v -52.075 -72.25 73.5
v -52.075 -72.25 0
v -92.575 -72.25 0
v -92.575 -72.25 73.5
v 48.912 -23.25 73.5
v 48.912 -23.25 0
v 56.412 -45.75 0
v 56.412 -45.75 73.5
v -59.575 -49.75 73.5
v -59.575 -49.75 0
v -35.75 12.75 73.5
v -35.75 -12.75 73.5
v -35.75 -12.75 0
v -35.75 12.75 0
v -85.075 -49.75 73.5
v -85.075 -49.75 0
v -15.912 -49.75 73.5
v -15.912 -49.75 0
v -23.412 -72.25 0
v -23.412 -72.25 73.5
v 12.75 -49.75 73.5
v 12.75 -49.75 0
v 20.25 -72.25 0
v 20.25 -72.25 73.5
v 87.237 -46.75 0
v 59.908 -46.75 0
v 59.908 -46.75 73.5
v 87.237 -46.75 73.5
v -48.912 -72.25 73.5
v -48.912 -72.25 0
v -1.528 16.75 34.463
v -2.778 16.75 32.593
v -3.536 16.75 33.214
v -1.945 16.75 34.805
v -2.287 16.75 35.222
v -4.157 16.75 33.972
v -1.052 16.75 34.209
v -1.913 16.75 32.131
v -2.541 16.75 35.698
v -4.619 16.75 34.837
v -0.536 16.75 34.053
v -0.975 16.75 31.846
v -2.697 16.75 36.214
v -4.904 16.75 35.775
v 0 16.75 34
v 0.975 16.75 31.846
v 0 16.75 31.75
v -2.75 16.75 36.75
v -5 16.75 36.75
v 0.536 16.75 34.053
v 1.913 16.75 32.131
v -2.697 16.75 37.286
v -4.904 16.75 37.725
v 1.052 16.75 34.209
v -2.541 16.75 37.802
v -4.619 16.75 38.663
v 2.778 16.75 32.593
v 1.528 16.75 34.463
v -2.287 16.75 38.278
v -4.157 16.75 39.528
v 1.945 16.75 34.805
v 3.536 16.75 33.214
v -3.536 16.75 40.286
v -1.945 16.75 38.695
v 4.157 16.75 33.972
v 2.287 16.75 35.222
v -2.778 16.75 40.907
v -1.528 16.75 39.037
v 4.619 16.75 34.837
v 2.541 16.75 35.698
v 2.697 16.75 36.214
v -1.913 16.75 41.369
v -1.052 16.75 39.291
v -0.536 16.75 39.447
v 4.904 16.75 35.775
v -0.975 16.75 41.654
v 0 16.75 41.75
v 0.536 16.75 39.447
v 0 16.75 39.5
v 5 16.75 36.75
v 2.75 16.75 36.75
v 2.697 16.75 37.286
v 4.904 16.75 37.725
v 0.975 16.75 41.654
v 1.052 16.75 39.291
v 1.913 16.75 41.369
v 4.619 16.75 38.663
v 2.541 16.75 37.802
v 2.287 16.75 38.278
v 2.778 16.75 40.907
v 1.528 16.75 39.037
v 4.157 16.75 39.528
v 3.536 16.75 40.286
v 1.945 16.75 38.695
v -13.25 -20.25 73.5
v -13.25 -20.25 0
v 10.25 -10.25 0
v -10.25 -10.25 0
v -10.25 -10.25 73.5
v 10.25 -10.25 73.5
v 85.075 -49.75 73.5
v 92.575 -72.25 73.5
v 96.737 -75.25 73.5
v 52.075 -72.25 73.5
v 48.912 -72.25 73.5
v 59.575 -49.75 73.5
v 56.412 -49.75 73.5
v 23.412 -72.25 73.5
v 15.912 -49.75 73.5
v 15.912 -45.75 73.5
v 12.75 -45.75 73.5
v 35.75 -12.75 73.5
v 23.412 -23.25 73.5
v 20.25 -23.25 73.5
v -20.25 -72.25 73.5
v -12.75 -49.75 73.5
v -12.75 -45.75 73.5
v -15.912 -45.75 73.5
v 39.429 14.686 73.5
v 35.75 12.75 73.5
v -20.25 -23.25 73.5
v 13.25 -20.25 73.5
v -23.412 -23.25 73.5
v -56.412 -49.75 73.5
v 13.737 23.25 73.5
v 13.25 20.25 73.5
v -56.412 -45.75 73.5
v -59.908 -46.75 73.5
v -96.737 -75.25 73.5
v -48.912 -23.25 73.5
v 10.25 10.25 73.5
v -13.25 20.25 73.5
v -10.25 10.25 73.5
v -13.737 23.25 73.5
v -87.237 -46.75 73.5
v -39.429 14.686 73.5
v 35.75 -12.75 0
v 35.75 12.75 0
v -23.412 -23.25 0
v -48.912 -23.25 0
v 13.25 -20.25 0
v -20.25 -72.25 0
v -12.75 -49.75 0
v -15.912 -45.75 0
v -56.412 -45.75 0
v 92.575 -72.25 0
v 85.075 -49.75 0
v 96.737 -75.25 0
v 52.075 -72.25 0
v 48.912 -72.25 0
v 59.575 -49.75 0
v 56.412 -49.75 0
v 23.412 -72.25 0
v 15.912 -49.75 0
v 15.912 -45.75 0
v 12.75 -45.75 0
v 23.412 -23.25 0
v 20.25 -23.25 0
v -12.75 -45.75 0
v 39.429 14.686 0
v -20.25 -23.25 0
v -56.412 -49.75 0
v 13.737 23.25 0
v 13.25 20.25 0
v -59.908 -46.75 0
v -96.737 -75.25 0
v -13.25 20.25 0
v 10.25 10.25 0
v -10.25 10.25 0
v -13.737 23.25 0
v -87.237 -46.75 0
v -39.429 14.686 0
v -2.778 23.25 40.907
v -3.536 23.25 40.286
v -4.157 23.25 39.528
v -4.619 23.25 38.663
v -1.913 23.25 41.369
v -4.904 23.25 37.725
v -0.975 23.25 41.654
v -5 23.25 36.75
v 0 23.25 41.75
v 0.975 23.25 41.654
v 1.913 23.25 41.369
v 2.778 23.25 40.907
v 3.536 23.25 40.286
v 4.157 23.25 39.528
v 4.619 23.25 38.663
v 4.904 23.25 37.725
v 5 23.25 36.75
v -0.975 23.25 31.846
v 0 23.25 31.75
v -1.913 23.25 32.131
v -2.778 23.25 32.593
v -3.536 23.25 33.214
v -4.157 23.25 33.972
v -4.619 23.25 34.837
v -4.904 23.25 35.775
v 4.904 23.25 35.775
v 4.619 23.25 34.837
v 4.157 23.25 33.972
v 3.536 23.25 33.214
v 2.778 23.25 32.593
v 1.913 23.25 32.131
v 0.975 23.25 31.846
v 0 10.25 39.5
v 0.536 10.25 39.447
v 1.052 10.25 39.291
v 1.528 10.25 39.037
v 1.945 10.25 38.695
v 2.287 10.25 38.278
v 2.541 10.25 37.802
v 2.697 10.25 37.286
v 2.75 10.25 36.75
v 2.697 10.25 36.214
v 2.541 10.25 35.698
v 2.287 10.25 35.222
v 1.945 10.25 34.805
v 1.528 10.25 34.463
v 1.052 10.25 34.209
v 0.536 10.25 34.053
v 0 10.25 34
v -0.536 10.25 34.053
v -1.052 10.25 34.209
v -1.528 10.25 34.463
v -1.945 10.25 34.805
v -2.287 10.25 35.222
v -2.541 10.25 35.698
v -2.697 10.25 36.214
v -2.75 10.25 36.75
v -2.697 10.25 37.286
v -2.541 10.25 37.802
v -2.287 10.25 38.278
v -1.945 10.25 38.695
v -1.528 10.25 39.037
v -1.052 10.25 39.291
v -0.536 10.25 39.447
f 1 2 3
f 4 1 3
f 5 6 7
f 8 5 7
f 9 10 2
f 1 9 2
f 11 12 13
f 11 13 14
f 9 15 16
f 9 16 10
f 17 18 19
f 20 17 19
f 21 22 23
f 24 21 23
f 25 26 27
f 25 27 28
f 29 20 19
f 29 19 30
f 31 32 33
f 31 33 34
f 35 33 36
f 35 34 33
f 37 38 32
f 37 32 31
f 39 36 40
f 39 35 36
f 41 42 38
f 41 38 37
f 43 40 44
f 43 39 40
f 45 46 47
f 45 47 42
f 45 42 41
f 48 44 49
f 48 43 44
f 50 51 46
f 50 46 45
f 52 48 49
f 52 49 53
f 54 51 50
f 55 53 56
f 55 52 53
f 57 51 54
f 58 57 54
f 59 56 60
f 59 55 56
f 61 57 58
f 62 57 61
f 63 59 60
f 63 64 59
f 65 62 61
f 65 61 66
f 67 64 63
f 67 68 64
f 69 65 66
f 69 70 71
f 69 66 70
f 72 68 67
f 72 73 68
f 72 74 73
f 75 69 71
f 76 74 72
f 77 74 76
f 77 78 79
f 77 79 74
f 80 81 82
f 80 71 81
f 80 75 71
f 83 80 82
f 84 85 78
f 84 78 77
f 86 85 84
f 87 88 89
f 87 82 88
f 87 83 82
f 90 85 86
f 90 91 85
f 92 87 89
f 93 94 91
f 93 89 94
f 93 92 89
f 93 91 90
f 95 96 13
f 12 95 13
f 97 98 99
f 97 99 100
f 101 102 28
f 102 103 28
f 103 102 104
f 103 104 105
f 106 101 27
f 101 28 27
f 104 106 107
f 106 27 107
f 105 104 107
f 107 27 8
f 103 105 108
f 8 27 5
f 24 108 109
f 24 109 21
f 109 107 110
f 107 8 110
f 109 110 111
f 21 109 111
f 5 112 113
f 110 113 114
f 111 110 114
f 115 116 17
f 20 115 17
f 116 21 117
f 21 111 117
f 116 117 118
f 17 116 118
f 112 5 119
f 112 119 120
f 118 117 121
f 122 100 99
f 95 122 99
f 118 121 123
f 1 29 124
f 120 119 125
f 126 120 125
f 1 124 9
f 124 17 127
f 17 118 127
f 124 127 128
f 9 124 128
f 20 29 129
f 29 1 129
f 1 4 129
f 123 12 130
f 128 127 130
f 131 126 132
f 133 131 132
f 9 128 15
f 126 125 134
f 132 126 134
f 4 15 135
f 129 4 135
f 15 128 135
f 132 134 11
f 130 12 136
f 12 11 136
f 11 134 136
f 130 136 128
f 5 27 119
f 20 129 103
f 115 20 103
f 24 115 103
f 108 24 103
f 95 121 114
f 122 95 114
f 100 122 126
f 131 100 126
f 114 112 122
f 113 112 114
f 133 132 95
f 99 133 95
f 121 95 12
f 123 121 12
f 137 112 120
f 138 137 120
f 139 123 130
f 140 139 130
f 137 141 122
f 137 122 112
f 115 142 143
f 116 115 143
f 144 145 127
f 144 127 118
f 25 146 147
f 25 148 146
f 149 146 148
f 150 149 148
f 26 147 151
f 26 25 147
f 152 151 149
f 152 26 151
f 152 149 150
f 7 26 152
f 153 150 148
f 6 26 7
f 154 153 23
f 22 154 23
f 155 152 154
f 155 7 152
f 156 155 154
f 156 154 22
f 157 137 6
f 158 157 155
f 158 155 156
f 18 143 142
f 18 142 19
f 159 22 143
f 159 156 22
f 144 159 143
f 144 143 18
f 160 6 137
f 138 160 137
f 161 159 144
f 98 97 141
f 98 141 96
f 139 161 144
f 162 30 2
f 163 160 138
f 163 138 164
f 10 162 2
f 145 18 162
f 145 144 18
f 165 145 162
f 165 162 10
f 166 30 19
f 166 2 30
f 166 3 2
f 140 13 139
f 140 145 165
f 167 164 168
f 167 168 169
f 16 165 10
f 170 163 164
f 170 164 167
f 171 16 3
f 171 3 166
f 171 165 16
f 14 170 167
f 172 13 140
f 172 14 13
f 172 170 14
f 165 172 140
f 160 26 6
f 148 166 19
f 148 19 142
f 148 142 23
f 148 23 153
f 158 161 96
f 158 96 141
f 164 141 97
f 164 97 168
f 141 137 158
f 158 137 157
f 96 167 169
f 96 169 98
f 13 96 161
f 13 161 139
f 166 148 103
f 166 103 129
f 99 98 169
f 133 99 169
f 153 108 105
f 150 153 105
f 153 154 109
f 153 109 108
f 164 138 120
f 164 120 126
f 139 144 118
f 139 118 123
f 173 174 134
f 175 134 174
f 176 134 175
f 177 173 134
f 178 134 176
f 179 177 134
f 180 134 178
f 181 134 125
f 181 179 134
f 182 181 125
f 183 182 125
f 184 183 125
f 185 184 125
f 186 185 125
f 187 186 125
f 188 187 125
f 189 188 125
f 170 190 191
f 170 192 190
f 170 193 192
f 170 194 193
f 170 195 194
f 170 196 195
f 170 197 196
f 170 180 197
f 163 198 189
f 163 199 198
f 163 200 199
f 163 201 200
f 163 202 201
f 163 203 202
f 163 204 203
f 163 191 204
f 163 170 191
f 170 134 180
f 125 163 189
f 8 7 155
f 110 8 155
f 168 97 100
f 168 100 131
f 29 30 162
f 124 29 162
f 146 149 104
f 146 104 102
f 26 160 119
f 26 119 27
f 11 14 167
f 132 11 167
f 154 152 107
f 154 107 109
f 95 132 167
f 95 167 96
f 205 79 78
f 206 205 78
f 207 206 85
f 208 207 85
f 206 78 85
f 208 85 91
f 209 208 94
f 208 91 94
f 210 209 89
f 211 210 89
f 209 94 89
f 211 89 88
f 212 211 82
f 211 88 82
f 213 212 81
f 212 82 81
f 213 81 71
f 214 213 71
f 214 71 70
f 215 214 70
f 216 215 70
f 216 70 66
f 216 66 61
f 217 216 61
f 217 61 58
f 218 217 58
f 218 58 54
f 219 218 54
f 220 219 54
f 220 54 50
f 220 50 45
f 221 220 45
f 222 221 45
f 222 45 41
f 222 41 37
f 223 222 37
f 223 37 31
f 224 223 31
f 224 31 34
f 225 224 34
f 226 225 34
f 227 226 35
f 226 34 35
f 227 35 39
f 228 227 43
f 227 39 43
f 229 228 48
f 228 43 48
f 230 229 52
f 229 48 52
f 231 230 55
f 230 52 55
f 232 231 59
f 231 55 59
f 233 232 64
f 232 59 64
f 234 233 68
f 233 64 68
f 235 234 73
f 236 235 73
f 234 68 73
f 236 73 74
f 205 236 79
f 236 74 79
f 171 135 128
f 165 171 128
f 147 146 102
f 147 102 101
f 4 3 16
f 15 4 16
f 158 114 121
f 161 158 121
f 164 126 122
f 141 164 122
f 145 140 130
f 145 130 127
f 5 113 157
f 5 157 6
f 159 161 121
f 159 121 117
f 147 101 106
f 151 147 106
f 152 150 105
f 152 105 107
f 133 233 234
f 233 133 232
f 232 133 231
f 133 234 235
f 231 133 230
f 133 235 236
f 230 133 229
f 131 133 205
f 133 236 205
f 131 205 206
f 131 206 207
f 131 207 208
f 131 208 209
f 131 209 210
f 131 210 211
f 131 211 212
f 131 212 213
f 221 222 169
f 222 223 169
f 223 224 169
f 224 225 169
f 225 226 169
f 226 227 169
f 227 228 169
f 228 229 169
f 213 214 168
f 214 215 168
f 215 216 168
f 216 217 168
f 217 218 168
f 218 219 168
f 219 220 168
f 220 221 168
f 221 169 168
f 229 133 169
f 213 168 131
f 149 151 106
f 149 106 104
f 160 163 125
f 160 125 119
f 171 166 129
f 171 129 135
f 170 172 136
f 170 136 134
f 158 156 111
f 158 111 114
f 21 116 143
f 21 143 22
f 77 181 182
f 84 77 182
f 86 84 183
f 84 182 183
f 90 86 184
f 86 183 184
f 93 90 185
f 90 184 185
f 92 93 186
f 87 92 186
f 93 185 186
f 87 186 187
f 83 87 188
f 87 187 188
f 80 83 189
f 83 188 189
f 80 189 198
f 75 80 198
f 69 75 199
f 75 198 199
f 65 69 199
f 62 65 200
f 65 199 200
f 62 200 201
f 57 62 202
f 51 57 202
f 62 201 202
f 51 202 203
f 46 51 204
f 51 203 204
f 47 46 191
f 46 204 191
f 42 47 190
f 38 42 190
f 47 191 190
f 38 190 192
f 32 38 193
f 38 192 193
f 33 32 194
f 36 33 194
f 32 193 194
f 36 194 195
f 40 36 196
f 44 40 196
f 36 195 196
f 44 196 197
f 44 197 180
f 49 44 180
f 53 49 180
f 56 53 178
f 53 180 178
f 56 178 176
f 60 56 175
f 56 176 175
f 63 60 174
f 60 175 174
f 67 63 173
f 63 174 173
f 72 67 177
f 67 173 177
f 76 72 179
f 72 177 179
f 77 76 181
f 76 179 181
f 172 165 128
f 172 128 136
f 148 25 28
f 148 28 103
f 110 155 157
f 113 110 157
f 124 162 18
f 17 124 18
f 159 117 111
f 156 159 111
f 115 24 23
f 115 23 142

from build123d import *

# Parameters (mm, degrees)
SKETCH1_W           = 20.5
SKETCH1_H           = 20.5
BOSS_EXTRUDE1_DEPTH = 73.5
SKETCH2_R           = 2.75
CUT_EXTRUDE1_DEPTH  = 33.5
SKETCH3_R           = 5
CUT_EXTRUDE2_DEPTH  = 6.5


with BuildPart() as part:
    # Sketch1 → Boss-Extrude1 (new body)
    with BuildSketch(Plane.XY):
        Polygon((-87.236832981, -46.75), (-59.907888654, -46.75), (-39.429270613, 14.685854123), (-13.736832981, 23.25), (13.736832981, 23.25), (39.429270613, 14.685854123), (59.907888654, -46.75), (87.236832981, -46.75), (96.736832981, -75.25), (-96.736832981, -75.25), align=None)
        Polygon((-13.25, 20.25), (-13.25, -20.25), (-35.75, -12.75), (-35.75, 12.75), align=None, mode=Mode.SUBTRACT)
        Rectangle(SKETCH1_W, SKETCH1_H, mode=Mode.SUBTRACT)
        Polygon((13.25, -20.25), (35.75, -12.75), (35.75, 12.75), (13.25, 20.25), align=None, mode=Mode.SUBTRACT)
        Polygon((-12.75, -49.75), (12.75, -49.75), (20.25, -72.25), (-20.25, -72.25), align=None, mode=Mode.SUBTRACT)
        Polygon((15.91227766, -49.75), (23.41227766, -72.25), (48.91227766, -72.25), (56.41227766, -49.75), align=None, mode=Mode.SUBTRACT)
        Polygon((-48.91227766, -72.25), (-56.41227766, -49.75), (-15.91227766, -49.75), (-23.41227766, -72.25), align=None, mode=Mode.SUBTRACT)
        Polygon((59.57455532, -49.75), (52.07455532, -72.25), (92.57455532, -72.25), (85.07455532, -49.75), align=None, mode=Mode.SUBTRACT)
        Polygon((-92.57455532, -72.25), (-85.07455532, -49.75), (-59.57455532, -49.75), (-52.07455532, -72.25), align=None, mode=Mode.SUBTRACT)
        Polygon((48.91227766, -23.25), (56.41227766, -45.75), (15.91227766, -45.75), (23.41227766, -23.25), align=None, mode=Mode.SUBTRACT)
        Polygon((20.25, -23.25), (-20.25, -23.25), (-12.75, -45.75), (12.75, -45.75), align=None, mode=Mode.SUBTRACT)
        Polygon((-23.41227766, -23.25), (-48.91227766, -23.25), (-56.41227766, -45.75), (-15.91227766, -45.75), align=None, mode=Mode.SUBTRACT)
    extrude(amount=BOSS_EXTRUDE1_DEPTH)

    # Sketch2 → Cut-Extrude1 (cut)
    with BuildSketch(Plane(origin=(0, 23.25, 0), x_dir=(1, 0, 0), z_dir=(0, 1, 0))):
        with Locations(Location((0, -36.75, 0), (0, 0, 270))):
            Circle(SKETCH2_R)
    extrude(amount=-CUT_EXTRUDE1_DEPTH, mode=Mode.SUBTRACT)

    # Sketch3 → Cut-Extrude2 (cut)
    with BuildSketch(Plane(origin=(0, 23.25, 0), x_dir=(1, 0, 0), z_dir=(0, 1, 0))):
        with Locations(Location((0, -36.75, 0), (0, 0, 270))):
            Circle(SKETCH3_R)
    extrude(amount=-CUT_EXTRUDE2_DEPTH, mode=Mode.SUBTRACT)


solid = part.part
